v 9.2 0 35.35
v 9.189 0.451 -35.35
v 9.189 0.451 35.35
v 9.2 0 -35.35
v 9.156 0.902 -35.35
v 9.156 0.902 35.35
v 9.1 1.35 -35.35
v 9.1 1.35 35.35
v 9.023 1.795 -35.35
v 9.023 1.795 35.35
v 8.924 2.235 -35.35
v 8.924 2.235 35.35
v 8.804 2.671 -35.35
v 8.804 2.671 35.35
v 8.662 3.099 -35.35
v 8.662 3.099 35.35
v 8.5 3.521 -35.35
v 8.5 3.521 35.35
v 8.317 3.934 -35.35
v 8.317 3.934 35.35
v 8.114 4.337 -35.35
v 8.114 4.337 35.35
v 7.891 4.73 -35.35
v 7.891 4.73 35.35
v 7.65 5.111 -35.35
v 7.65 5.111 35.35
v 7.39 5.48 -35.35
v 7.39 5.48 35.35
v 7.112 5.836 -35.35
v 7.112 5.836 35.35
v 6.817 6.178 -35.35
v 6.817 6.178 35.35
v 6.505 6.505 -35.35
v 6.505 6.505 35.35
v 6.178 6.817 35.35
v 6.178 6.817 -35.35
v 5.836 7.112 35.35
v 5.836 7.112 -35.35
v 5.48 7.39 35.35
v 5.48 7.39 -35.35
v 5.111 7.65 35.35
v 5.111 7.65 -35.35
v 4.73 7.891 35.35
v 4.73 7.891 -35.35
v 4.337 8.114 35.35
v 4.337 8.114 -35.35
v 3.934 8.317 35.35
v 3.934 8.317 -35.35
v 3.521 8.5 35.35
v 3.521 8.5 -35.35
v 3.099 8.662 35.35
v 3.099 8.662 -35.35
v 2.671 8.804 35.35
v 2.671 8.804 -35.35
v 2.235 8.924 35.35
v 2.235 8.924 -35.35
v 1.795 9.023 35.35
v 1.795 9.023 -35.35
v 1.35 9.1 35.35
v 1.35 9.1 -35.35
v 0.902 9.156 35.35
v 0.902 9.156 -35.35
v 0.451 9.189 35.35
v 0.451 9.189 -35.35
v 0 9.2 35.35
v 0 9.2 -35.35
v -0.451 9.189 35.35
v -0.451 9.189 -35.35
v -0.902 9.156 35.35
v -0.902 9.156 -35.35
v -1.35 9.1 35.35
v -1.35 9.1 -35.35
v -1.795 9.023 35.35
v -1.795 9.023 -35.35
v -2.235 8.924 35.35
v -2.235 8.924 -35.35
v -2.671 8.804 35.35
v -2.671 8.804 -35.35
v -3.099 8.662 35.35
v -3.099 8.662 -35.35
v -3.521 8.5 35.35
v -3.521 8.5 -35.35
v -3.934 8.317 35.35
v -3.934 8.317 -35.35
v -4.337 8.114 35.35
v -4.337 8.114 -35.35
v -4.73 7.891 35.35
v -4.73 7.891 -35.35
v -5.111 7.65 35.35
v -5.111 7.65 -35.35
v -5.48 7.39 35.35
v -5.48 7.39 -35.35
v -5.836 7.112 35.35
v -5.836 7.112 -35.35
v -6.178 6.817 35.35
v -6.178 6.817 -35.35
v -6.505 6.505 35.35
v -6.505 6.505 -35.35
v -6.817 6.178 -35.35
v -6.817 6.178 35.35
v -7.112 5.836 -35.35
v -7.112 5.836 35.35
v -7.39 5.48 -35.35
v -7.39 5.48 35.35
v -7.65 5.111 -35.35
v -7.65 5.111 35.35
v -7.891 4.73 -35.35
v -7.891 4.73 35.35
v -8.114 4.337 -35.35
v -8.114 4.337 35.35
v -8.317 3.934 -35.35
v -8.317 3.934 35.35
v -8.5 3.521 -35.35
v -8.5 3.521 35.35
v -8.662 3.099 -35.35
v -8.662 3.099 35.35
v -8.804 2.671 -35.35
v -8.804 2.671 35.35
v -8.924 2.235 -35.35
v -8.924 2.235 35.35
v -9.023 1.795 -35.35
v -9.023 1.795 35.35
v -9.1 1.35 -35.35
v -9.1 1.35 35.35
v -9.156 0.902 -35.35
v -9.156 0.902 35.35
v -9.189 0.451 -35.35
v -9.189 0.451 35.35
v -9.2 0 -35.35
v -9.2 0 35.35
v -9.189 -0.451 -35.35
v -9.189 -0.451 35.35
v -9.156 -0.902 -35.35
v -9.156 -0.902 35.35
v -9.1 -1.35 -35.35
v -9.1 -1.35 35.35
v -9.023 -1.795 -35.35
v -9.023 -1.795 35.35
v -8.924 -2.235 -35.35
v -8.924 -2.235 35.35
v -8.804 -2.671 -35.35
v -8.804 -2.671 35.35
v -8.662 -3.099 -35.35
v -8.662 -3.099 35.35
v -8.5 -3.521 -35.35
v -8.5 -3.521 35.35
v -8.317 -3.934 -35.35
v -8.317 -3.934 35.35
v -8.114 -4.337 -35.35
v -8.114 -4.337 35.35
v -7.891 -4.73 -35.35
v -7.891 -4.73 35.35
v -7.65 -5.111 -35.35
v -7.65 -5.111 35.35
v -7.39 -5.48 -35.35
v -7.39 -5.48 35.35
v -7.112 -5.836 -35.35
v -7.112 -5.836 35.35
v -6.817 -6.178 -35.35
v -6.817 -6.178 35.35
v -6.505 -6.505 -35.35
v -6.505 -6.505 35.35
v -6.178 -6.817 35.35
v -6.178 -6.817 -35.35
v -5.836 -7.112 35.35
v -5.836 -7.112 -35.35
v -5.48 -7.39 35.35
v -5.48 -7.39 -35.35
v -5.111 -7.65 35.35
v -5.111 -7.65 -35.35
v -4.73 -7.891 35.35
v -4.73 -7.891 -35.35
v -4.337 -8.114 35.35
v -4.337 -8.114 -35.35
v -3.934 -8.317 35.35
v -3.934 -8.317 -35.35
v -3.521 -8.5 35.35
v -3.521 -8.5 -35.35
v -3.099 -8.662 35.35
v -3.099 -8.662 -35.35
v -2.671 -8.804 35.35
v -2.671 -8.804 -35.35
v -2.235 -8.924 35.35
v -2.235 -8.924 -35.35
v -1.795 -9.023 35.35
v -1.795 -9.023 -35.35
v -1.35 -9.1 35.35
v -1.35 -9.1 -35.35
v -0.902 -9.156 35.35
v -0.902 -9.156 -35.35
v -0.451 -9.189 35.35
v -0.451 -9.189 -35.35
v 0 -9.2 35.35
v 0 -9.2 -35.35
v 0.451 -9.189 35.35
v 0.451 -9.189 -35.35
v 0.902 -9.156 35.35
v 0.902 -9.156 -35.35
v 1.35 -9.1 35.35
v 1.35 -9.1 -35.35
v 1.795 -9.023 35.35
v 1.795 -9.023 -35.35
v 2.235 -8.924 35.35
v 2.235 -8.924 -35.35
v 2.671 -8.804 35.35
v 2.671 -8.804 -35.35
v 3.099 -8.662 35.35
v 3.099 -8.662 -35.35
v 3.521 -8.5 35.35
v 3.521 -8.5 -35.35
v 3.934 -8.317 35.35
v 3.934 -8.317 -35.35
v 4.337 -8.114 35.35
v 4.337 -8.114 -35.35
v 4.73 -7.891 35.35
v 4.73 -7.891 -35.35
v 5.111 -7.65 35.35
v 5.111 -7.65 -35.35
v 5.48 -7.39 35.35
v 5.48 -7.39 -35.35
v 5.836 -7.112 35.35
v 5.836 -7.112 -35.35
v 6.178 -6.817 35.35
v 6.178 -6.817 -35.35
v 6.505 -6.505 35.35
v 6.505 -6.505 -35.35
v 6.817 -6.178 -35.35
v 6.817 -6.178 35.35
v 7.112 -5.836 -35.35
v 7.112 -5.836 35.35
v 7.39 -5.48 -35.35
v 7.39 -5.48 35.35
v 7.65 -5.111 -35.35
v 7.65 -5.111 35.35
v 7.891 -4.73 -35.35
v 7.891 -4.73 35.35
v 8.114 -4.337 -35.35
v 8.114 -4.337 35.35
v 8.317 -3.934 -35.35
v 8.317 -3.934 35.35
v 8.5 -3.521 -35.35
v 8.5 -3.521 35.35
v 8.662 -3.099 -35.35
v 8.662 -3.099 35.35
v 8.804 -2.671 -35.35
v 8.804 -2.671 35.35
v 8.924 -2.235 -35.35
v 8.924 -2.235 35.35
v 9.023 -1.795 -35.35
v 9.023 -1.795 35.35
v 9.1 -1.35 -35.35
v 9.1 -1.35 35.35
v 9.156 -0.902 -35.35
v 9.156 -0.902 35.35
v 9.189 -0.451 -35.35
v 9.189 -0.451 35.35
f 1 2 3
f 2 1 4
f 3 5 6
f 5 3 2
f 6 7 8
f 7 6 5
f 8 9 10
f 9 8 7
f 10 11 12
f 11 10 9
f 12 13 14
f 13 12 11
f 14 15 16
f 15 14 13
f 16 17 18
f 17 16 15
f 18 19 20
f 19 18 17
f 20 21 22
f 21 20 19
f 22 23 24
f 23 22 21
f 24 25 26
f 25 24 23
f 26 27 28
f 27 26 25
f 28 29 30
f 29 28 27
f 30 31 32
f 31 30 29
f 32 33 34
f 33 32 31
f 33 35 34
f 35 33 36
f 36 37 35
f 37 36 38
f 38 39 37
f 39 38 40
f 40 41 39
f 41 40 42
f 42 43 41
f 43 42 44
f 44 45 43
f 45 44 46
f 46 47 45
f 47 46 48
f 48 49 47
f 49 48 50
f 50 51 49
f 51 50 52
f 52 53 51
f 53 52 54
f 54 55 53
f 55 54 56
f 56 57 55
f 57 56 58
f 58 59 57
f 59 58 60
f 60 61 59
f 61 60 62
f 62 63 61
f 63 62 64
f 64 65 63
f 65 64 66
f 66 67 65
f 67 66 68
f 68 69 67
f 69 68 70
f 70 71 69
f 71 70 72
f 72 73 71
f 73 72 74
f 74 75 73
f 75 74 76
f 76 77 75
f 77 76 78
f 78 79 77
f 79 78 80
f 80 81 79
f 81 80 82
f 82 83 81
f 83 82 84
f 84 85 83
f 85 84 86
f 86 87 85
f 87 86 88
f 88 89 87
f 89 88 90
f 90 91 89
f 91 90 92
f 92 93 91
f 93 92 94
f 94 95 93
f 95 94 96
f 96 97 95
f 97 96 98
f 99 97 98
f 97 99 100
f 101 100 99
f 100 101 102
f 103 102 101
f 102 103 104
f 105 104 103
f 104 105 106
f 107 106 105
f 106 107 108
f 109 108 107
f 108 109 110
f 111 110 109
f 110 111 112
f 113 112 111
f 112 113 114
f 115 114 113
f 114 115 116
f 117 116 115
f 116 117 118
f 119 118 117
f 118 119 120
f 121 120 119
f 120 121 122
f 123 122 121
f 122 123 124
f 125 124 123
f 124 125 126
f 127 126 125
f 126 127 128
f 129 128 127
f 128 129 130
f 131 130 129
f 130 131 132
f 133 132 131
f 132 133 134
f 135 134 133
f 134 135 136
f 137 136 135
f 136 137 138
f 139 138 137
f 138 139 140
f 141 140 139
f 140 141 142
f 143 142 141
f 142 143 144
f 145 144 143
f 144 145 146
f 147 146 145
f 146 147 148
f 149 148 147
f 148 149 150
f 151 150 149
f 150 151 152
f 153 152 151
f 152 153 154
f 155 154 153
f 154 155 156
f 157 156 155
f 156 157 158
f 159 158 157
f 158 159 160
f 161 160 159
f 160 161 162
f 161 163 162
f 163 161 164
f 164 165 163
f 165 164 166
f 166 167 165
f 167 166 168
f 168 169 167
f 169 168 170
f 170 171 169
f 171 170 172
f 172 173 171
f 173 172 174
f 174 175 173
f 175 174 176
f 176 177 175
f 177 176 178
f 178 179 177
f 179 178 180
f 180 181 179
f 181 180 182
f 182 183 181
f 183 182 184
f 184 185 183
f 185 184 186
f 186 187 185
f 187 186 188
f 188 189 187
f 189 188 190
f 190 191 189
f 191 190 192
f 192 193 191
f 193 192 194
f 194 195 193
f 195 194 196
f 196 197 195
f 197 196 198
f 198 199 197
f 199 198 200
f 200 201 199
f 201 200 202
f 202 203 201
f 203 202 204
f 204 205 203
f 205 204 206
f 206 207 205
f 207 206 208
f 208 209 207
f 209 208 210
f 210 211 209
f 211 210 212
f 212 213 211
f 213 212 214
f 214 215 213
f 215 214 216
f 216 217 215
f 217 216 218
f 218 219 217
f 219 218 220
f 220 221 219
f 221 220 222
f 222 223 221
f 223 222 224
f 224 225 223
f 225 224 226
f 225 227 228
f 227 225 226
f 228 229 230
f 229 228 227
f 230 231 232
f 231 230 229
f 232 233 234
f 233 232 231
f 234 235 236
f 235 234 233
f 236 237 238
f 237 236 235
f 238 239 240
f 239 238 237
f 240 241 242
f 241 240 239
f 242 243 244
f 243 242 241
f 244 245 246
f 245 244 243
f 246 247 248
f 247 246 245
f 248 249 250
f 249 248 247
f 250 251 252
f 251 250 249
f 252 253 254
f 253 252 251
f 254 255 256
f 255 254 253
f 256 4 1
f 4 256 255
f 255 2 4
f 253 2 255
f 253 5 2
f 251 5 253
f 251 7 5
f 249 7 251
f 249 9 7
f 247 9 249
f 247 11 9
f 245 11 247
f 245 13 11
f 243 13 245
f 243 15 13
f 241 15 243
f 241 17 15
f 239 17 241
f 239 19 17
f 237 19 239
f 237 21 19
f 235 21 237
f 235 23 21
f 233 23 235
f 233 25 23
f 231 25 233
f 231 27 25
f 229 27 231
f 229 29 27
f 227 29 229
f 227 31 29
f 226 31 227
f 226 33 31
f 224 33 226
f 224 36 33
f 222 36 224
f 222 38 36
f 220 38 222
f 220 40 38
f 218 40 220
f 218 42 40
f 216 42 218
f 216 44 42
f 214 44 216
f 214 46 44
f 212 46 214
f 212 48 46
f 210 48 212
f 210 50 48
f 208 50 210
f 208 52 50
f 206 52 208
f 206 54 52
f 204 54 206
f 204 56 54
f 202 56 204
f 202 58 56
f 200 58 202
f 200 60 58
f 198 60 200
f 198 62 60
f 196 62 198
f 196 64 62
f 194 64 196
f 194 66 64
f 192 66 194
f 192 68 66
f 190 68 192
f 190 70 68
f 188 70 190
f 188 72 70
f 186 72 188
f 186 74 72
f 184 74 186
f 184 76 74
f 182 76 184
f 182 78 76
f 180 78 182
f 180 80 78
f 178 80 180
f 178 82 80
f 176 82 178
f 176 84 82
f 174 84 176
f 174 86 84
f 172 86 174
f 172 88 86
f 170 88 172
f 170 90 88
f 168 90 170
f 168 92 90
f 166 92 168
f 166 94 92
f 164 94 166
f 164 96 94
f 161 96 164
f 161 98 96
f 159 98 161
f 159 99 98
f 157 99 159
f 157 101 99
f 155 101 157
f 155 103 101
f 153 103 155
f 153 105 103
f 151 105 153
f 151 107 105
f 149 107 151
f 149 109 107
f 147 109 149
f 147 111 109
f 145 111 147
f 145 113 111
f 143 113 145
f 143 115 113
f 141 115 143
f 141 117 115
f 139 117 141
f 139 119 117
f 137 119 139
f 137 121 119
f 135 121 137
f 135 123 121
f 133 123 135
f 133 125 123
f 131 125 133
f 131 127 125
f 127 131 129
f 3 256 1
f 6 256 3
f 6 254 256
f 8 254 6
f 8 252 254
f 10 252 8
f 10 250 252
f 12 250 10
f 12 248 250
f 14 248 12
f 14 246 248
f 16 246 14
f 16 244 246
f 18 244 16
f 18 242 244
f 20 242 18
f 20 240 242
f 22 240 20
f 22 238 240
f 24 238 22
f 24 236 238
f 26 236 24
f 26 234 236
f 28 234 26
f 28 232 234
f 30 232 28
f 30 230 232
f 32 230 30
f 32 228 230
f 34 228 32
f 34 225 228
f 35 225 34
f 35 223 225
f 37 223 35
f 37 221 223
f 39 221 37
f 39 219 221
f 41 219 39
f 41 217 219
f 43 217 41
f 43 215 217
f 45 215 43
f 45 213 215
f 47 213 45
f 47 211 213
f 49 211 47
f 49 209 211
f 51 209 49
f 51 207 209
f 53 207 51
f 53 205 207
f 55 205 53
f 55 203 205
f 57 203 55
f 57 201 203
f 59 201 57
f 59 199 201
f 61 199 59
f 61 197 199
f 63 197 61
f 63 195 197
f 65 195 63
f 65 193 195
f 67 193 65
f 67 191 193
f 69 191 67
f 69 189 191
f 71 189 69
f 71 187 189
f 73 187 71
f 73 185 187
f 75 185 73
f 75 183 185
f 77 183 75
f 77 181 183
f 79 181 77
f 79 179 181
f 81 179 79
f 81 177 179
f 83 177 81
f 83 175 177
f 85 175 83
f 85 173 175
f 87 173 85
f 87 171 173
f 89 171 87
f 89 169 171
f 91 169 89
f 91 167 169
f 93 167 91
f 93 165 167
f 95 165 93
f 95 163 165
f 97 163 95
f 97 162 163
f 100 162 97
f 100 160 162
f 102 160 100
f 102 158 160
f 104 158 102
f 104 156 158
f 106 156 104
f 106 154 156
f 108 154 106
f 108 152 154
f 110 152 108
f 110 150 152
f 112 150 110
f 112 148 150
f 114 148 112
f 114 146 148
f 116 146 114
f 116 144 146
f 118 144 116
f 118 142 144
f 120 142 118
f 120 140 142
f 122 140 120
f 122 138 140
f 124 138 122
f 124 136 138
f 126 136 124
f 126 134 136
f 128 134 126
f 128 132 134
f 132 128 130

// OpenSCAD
$fn=128;

cell_height = 70.7;
cell_diameter = 18.4;

module battery_cell(h, d) {
    cylinder(h=h, d=d, center=true);
}

battery_cell(cell_height, cell_diameter);
